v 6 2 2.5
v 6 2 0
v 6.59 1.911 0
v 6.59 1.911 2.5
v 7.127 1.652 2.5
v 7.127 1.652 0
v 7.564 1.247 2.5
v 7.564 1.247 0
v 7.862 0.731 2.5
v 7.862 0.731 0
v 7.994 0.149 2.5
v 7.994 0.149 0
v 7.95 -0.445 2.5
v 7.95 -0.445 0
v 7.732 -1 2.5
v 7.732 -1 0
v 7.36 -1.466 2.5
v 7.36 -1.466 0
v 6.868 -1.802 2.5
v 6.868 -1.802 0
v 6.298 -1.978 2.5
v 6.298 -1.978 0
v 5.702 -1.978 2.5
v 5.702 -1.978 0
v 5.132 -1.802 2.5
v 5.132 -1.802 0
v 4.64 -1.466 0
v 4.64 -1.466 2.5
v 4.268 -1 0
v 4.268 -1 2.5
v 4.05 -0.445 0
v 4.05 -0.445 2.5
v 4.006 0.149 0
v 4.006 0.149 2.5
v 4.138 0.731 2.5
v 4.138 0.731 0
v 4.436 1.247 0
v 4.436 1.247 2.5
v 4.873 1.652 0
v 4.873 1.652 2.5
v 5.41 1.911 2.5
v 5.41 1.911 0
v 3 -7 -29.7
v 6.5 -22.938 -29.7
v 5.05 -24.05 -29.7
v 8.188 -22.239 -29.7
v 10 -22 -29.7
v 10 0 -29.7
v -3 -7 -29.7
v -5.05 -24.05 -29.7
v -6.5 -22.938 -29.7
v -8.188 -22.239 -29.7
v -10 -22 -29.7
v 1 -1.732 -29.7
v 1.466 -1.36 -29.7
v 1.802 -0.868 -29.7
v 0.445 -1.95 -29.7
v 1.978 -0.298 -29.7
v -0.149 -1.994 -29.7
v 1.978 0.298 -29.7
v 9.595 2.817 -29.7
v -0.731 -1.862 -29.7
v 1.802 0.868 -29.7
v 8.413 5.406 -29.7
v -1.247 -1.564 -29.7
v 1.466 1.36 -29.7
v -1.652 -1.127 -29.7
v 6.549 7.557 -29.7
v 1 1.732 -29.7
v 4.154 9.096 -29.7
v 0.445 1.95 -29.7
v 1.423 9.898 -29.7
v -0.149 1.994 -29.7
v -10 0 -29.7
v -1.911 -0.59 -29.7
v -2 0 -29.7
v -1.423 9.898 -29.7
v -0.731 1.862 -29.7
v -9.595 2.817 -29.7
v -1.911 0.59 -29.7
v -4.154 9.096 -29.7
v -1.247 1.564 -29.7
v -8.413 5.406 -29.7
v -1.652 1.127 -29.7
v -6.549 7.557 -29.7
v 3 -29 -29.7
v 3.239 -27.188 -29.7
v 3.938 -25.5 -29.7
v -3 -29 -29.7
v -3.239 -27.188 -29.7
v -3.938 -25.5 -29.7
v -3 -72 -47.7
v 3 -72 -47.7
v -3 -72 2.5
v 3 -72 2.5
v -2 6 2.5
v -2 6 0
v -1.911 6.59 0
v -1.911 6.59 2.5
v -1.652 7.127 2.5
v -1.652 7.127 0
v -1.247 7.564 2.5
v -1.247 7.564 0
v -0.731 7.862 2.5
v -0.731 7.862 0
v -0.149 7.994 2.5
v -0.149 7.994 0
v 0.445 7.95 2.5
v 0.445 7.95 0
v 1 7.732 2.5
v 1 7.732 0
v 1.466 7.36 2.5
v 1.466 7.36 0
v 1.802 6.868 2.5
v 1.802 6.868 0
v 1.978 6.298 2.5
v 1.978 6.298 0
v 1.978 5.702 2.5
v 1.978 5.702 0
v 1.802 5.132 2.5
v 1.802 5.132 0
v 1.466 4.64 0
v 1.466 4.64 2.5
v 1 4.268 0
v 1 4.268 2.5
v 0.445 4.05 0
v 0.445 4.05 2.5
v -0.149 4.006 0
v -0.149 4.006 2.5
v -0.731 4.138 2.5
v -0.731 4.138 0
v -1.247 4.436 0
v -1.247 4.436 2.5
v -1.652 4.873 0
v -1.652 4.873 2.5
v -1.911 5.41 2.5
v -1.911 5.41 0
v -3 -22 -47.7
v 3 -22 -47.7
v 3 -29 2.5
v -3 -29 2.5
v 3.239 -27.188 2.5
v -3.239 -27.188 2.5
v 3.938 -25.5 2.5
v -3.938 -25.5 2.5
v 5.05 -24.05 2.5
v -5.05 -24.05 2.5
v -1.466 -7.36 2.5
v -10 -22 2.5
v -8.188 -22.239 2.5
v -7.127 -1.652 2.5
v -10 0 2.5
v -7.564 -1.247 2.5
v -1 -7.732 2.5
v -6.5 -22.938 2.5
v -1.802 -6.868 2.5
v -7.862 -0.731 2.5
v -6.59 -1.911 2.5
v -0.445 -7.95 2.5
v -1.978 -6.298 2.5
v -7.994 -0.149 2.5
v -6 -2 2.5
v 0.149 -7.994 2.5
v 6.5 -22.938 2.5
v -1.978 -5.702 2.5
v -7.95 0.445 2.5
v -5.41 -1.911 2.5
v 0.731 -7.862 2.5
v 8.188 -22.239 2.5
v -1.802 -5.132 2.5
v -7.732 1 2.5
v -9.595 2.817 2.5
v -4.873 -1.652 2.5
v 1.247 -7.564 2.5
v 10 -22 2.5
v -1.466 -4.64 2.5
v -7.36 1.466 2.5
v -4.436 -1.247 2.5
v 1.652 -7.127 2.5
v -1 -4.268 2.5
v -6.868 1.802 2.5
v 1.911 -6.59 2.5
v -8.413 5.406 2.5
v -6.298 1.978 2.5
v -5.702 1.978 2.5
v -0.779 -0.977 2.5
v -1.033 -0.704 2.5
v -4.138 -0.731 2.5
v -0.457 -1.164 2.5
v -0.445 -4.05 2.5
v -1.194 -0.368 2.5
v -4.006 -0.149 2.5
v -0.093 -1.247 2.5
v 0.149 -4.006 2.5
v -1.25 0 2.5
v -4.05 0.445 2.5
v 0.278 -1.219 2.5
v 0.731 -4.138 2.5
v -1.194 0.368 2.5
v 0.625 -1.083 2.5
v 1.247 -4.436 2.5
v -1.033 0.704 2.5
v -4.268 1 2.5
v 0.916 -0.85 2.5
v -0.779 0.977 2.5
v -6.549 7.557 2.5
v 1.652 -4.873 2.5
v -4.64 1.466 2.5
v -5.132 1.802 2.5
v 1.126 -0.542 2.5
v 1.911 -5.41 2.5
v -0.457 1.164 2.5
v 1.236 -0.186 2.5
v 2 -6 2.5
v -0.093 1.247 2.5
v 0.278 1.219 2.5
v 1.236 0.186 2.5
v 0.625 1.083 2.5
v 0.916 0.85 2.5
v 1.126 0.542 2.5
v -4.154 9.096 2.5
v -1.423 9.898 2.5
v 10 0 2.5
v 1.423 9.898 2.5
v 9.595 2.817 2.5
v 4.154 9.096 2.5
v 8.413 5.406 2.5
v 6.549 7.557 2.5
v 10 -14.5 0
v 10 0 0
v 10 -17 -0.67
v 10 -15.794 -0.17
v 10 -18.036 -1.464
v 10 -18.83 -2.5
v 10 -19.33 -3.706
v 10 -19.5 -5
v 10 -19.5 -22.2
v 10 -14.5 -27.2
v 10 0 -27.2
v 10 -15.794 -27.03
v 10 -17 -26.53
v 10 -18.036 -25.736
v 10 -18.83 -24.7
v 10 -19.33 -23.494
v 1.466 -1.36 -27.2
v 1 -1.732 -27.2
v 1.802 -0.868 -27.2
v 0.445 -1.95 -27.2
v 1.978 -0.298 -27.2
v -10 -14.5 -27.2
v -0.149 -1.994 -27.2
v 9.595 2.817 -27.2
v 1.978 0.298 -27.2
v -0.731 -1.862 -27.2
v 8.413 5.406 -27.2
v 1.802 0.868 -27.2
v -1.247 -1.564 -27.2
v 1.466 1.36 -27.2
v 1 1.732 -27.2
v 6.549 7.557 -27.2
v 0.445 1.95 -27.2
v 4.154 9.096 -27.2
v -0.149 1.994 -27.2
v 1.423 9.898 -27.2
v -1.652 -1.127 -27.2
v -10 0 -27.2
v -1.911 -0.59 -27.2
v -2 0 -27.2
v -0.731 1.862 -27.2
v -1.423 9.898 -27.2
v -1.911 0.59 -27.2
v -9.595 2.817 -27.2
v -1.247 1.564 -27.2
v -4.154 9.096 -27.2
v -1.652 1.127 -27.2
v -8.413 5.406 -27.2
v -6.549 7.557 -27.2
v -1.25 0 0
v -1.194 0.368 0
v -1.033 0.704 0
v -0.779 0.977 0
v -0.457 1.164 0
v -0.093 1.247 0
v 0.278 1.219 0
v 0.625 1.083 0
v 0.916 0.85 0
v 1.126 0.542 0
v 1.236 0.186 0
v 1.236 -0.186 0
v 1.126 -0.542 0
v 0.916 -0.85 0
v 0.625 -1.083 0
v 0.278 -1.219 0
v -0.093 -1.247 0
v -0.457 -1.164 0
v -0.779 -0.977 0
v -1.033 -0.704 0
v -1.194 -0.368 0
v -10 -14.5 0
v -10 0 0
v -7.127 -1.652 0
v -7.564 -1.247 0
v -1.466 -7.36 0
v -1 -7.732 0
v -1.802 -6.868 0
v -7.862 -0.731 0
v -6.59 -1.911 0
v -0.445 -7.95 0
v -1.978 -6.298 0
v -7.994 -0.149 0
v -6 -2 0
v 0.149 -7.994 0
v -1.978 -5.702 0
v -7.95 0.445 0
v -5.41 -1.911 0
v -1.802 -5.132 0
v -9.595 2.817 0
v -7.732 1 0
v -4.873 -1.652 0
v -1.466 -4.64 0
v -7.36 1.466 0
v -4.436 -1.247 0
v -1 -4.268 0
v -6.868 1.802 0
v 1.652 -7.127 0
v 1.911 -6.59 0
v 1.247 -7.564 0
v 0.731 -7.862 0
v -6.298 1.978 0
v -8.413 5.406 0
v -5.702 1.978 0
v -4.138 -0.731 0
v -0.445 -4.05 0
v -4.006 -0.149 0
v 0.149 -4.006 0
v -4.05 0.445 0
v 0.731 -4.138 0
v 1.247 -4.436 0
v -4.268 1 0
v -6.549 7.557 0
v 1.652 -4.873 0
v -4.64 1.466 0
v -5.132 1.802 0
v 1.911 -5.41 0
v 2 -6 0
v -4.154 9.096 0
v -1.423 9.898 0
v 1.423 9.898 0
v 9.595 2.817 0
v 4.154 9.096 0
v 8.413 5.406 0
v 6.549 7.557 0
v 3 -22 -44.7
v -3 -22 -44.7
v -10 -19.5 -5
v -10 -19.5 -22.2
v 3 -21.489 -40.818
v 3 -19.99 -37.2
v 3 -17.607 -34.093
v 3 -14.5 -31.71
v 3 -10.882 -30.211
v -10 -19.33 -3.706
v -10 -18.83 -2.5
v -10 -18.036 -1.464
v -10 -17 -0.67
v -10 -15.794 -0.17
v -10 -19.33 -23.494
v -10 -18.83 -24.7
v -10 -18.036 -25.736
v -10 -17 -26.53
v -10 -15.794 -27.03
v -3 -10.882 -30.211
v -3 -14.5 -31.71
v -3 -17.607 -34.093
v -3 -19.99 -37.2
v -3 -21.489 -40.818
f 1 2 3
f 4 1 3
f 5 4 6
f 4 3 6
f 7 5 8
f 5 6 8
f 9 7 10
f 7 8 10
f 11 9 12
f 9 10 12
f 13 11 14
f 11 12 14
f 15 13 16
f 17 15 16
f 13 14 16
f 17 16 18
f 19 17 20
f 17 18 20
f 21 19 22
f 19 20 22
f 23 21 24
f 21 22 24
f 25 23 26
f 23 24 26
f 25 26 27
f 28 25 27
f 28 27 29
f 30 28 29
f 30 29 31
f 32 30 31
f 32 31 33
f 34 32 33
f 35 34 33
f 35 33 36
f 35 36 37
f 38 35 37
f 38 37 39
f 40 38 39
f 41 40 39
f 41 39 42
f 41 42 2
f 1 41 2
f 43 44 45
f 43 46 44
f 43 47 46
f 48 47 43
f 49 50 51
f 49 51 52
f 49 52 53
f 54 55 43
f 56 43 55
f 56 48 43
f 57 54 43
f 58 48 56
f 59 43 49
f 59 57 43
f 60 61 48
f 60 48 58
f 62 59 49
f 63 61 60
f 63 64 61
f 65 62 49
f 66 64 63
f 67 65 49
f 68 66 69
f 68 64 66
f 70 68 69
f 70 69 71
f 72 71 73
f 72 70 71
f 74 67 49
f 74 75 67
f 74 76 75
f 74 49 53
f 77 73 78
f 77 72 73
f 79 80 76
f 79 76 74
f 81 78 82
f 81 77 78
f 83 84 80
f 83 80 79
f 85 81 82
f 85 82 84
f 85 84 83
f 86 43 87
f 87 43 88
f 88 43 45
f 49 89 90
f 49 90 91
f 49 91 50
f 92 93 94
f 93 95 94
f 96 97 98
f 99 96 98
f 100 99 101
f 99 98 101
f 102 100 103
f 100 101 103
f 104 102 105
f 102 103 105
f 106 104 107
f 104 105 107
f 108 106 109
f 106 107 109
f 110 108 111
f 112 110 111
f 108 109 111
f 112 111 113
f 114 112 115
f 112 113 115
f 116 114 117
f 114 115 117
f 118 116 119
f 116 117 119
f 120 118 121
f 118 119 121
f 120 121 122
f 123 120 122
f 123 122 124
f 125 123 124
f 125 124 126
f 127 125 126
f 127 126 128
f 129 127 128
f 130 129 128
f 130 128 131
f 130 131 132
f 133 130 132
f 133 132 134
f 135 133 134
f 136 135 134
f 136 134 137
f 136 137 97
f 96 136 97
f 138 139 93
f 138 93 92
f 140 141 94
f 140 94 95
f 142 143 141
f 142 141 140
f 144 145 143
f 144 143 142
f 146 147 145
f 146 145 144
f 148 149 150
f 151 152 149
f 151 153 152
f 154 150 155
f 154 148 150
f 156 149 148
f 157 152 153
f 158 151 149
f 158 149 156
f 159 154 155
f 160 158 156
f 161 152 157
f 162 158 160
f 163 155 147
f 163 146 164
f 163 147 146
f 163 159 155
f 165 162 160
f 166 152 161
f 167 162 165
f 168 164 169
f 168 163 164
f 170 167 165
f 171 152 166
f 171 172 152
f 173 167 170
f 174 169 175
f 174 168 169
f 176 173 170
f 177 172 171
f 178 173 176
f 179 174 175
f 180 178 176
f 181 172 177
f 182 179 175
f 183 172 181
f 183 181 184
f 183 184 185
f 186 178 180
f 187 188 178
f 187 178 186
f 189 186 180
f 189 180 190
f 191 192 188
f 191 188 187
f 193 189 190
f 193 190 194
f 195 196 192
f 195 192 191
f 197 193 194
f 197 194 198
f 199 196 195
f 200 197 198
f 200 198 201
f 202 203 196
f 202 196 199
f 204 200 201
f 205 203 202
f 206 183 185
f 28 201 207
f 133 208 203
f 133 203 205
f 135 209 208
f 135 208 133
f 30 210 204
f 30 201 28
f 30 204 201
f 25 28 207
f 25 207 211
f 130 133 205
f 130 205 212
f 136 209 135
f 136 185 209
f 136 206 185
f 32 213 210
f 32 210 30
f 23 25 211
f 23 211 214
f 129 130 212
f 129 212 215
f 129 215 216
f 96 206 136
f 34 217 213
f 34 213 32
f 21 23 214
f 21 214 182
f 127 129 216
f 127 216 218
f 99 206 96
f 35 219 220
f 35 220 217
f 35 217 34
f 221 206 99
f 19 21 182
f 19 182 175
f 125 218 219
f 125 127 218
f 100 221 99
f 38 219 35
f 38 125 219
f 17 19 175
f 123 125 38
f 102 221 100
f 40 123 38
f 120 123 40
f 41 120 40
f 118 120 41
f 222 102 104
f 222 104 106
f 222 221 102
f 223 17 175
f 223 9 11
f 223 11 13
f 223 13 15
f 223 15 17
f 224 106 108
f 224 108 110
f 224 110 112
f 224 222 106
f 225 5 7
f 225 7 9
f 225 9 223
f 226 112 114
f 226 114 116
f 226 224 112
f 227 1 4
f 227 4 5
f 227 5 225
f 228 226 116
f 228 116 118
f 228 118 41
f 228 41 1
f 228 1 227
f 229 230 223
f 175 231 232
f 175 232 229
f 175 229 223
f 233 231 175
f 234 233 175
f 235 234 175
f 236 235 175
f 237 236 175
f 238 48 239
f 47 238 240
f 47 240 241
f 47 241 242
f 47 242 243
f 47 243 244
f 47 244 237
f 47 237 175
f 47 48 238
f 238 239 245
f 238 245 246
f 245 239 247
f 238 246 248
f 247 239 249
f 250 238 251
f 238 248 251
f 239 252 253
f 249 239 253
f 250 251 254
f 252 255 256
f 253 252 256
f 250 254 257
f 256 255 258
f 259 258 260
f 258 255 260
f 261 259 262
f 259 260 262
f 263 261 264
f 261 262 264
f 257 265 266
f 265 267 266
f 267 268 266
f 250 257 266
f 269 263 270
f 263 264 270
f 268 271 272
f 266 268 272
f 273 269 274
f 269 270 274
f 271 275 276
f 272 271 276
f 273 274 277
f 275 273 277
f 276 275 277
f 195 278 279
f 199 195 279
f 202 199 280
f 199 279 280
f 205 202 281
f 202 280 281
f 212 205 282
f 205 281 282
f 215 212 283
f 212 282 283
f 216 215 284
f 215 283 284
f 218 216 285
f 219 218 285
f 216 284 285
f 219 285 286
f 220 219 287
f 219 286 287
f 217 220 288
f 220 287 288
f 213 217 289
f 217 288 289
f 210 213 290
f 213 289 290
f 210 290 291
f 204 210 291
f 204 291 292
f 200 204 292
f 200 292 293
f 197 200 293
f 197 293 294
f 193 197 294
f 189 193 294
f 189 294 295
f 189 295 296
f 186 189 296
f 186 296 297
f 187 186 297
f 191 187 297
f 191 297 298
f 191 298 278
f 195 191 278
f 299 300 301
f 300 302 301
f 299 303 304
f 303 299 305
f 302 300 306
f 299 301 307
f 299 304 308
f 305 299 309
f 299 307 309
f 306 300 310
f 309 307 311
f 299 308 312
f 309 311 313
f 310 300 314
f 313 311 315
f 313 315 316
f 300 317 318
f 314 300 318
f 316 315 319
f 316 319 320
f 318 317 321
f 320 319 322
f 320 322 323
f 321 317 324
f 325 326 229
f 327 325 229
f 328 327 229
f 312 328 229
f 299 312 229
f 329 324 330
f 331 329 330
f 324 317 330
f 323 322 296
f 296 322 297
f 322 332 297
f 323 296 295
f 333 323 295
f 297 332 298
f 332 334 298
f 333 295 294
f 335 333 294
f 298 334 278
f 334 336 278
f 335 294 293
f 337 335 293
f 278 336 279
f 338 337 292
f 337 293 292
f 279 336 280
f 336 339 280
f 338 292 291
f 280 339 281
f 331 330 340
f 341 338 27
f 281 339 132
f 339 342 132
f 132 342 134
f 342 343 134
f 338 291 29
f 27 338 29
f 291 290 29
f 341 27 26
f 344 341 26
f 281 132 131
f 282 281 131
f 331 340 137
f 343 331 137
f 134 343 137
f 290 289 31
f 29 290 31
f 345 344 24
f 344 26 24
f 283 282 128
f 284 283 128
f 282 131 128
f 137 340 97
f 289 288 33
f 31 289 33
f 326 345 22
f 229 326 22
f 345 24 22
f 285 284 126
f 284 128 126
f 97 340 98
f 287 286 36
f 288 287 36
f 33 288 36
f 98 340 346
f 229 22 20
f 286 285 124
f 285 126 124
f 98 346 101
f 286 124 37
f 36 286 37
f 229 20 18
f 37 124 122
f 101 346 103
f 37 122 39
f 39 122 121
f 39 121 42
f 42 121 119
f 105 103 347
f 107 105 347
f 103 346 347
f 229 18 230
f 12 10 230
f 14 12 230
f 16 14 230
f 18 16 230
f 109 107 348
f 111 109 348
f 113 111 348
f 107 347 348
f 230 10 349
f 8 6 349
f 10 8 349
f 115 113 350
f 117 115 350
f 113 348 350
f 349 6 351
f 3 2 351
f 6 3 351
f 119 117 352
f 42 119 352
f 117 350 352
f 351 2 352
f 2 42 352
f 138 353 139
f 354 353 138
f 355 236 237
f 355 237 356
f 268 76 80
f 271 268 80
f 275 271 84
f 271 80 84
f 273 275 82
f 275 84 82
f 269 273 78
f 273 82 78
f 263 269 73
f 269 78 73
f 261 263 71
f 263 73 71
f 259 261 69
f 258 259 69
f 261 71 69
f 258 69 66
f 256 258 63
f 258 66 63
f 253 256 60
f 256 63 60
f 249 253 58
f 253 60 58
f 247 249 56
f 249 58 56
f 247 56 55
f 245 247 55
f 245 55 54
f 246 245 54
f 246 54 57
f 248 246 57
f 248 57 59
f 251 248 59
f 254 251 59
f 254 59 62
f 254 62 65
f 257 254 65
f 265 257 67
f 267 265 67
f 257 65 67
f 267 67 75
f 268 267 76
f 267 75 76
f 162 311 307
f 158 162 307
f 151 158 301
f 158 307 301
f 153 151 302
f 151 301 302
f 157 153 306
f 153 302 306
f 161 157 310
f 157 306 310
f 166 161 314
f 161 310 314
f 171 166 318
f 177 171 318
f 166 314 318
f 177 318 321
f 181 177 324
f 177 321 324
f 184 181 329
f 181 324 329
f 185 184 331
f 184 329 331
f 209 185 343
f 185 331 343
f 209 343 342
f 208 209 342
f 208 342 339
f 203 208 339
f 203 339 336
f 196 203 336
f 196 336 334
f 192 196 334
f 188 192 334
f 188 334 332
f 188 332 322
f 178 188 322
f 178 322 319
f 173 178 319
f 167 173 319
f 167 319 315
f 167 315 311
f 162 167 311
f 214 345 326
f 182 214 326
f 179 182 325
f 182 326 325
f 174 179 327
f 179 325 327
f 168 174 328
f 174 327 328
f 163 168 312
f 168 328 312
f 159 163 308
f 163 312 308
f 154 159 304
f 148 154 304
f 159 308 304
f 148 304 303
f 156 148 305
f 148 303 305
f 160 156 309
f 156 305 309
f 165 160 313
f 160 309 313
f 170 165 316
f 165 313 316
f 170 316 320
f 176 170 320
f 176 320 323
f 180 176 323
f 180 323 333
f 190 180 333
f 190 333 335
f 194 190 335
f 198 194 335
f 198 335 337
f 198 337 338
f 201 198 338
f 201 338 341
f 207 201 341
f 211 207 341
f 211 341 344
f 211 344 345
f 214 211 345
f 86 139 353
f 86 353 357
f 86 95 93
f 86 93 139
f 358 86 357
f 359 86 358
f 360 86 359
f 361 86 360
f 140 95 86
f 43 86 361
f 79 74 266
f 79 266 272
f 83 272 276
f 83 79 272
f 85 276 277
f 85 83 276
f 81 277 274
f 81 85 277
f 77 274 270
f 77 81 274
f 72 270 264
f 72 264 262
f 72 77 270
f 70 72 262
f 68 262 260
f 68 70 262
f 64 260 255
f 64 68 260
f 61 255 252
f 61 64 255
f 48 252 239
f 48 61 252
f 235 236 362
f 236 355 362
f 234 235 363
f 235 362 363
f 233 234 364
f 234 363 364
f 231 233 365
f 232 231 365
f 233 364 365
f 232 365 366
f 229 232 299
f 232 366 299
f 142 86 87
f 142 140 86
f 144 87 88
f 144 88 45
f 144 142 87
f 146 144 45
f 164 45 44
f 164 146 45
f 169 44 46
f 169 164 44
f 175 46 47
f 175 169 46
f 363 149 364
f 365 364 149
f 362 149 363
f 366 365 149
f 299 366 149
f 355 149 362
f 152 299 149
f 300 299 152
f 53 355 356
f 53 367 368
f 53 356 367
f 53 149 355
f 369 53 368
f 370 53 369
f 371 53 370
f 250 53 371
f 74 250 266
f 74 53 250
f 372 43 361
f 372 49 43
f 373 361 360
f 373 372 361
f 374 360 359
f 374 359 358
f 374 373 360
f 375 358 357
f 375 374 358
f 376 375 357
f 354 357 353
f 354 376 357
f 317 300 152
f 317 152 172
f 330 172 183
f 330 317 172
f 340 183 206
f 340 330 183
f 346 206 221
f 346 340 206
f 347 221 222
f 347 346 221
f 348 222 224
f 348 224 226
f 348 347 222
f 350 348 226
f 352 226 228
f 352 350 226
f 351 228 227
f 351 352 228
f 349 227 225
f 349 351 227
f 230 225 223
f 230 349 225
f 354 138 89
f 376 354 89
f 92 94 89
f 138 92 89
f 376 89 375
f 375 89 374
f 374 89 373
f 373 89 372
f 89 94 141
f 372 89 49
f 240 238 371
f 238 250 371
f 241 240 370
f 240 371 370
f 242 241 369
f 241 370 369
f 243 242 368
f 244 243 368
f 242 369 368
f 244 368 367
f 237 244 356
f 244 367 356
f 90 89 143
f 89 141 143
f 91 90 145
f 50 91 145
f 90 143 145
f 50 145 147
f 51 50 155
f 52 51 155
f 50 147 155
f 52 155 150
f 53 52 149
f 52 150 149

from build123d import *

# Parameters (mm, degrees)
SKETCH2_R           = 10
BOSS_EXTRUDE1_DEPTH = 2.5
SKETCH4_R           = 1.25
CUT_EXTRUDE3_DEPTH  = 10
SKETCH5_R           = 2
CUT_EXTRUDE4_DEPTH  = 10
CIRPATTERN1_COUNT   = 4
BOSS_EXTRUDE2_START = -2.5
BOSS_EXTRUDE2_DEPTH = 2.5
SKETCH8_W           = 20
SKETCH8_H           = 2.5
BOSS_EXTRUDE3_DEPTH = 27.2
BOSS_EXTRUDE4_START = 2.5
SKETCH10_R          = 2
BOSS_EXTRUDE4_DEPTH = 2.5
FILLET1_R           = 5
SKETCH12_W          = 6
SKETCH12_H          = 32.2
BOSS_EXTRUDE5_DEPTH = 50
SKETCH13_W          = 6
SKETCH13_H          = 50
BOSS_EXTRUDE6_DEPTH = 18
FILLET2_R           = 7
FILLET3_R           = 15


with BuildPart() as part:
    # Sketch2 → Boss-Extrude1 (new body)
    with BuildSketch(Plane(origin=(0, 0, 0), x_dir=(-1, 0, 0), z_dir=(0, 0, -1))):
        Circle(SKETCH2_R)
    extrude(amount=-BOSS_EXTRUDE1_DEPTH)

    # Sketch4 → Cut-Extrude3 (cut)
    with BuildSketch(Plane(origin=(0, 0, 0), x_dir=(-1, 0, 0), z_dir=(0, 0, -1))):
        Circle(SKETCH4_R)
    extrude(amount=-CUT_EXTRUDE3_DEPTH, mode=Mode.SUBTRACT)

    # Sketch5 → Cut-Extrude4 (cut)
    with BuildSketch(Plane(origin=(0, 0, 0), x_dir=(-1, 0, 0), z_dir=(0, 0, -1))):
        with Locations((0, 6)):
            Circle(SKETCH5_R)
    cut_extrude4 = extrude(amount=-CUT_EXTRUDE4_DEPTH, mode=Mode.SUBTRACT)

    # CirPattern1: Cut-Extrude4 ×4 about axis
    cirpattern1_axis = Axis((0, 0, 0), (0, 0, 1))
    for i in range(1, CIRPATTERN1_COUNT):
        add(cut_extrude4.rotate(cirpattern1_axis, i * 360 / CIRPATTERN1_COUNT), mode=Mode.SUBTRACT)

    # Sketch6 → Boss-Extrude2 (add)
    with BuildSketch(Plane.XY.offset(2.5).offset(BOSS_EXTRUDE2_START)):
        with BuildLine():
            Line((-10, 0), (-10, -22))
            Line((-10, -22), (10, -22))
            Line((10, -22), (10, 0))
            ThreePointArc((10, 0), (0, -10), (-10, 0))
        make_face()
    extrude(amount=BOSS_EXTRUDE2_DEPTH)

    # Sketch8 → Boss-Extrude3 (add)
    with BuildSketch(Plane(origin=(0, 0, 0), x_dir=(-1, 0, 0), z_dir=(0, 0, -1))):
        with Locations((0, -20.75)):
            Rectangle(SKETCH8_W, SKETCH8_H)
    extrude(amount=BOSS_EXTRUDE3_DEPTH)

    # Sketch10 → Boss-Extrude4 (add)
    with BuildSketch(Plane(origin=(0, 0, -27.2), x_dir=(-1, 0, 0), z_dir=(0, 0, -1)).offset(BOSS_EXTRUDE4_START)):
        with BuildLine():
            Line((-10, -22), (10, -22))
            Line((10, -22), (10, 0))
            ThreePointArc((10, 0), (0, 10), (-10, 0))
            Line((-10, 0), (-10, -22))
        make_face()
        Circle(SKETCH10_R, mode=Mode.SUBTRACT)
    extrude(amount=-BOSS_EXTRUDE4_DEPTH)

    # Fillet1
    fillet1_edges = [part.edges().sort_by_distance(p)[0] for p in [
        (0, -19.5, 0),
        (0, -19.5, -27.2),
    ]]
    fillet(fillet1_edges, radius=FILLET1_R)

    # Sketch12 → Boss-Extrude5 (add)
    with BuildSketch(Plane.XZ.offset(22)):
        with Locations((0, -13.6)):
            Rectangle(SKETCH12_W, SKETCH12_H)
    extrude(amount=BOSS_EXTRUDE5_DEPTH)

    # Sketch13 → Boss-Extrude6 (add)
    with BuildSketch(Plane(origin=(0, 0, -29.7), x_dir=(-1, 0, 0), z_dir=(0, 0, -1))):
        with Locations((0, -47)):
            Rectangle(SKETCH13_W, SKETCH13_H)
    extrude(amount=BOSS_EXTRUDE6_DEPTH)

    # Fillet2
    fillet2_edges = [part.edges().sort_by_distance(p)[0] for p in [
        (-3, -22, -13.6),
        (3, -22, -13.6),
    ]]
    fillet(fillet2_edges, radius=FILLET2_R - 0.0001)  # a hair under: the kernel refuses the full size

    # Fillet3
    fillet3_edges = [part.edges().sort_by_distance(p)[0] for p in [
        (0, -22, -29.7),
    ]]
    fillet(fillet3_edges, radius=FILLET3_R)


solid = part.part
